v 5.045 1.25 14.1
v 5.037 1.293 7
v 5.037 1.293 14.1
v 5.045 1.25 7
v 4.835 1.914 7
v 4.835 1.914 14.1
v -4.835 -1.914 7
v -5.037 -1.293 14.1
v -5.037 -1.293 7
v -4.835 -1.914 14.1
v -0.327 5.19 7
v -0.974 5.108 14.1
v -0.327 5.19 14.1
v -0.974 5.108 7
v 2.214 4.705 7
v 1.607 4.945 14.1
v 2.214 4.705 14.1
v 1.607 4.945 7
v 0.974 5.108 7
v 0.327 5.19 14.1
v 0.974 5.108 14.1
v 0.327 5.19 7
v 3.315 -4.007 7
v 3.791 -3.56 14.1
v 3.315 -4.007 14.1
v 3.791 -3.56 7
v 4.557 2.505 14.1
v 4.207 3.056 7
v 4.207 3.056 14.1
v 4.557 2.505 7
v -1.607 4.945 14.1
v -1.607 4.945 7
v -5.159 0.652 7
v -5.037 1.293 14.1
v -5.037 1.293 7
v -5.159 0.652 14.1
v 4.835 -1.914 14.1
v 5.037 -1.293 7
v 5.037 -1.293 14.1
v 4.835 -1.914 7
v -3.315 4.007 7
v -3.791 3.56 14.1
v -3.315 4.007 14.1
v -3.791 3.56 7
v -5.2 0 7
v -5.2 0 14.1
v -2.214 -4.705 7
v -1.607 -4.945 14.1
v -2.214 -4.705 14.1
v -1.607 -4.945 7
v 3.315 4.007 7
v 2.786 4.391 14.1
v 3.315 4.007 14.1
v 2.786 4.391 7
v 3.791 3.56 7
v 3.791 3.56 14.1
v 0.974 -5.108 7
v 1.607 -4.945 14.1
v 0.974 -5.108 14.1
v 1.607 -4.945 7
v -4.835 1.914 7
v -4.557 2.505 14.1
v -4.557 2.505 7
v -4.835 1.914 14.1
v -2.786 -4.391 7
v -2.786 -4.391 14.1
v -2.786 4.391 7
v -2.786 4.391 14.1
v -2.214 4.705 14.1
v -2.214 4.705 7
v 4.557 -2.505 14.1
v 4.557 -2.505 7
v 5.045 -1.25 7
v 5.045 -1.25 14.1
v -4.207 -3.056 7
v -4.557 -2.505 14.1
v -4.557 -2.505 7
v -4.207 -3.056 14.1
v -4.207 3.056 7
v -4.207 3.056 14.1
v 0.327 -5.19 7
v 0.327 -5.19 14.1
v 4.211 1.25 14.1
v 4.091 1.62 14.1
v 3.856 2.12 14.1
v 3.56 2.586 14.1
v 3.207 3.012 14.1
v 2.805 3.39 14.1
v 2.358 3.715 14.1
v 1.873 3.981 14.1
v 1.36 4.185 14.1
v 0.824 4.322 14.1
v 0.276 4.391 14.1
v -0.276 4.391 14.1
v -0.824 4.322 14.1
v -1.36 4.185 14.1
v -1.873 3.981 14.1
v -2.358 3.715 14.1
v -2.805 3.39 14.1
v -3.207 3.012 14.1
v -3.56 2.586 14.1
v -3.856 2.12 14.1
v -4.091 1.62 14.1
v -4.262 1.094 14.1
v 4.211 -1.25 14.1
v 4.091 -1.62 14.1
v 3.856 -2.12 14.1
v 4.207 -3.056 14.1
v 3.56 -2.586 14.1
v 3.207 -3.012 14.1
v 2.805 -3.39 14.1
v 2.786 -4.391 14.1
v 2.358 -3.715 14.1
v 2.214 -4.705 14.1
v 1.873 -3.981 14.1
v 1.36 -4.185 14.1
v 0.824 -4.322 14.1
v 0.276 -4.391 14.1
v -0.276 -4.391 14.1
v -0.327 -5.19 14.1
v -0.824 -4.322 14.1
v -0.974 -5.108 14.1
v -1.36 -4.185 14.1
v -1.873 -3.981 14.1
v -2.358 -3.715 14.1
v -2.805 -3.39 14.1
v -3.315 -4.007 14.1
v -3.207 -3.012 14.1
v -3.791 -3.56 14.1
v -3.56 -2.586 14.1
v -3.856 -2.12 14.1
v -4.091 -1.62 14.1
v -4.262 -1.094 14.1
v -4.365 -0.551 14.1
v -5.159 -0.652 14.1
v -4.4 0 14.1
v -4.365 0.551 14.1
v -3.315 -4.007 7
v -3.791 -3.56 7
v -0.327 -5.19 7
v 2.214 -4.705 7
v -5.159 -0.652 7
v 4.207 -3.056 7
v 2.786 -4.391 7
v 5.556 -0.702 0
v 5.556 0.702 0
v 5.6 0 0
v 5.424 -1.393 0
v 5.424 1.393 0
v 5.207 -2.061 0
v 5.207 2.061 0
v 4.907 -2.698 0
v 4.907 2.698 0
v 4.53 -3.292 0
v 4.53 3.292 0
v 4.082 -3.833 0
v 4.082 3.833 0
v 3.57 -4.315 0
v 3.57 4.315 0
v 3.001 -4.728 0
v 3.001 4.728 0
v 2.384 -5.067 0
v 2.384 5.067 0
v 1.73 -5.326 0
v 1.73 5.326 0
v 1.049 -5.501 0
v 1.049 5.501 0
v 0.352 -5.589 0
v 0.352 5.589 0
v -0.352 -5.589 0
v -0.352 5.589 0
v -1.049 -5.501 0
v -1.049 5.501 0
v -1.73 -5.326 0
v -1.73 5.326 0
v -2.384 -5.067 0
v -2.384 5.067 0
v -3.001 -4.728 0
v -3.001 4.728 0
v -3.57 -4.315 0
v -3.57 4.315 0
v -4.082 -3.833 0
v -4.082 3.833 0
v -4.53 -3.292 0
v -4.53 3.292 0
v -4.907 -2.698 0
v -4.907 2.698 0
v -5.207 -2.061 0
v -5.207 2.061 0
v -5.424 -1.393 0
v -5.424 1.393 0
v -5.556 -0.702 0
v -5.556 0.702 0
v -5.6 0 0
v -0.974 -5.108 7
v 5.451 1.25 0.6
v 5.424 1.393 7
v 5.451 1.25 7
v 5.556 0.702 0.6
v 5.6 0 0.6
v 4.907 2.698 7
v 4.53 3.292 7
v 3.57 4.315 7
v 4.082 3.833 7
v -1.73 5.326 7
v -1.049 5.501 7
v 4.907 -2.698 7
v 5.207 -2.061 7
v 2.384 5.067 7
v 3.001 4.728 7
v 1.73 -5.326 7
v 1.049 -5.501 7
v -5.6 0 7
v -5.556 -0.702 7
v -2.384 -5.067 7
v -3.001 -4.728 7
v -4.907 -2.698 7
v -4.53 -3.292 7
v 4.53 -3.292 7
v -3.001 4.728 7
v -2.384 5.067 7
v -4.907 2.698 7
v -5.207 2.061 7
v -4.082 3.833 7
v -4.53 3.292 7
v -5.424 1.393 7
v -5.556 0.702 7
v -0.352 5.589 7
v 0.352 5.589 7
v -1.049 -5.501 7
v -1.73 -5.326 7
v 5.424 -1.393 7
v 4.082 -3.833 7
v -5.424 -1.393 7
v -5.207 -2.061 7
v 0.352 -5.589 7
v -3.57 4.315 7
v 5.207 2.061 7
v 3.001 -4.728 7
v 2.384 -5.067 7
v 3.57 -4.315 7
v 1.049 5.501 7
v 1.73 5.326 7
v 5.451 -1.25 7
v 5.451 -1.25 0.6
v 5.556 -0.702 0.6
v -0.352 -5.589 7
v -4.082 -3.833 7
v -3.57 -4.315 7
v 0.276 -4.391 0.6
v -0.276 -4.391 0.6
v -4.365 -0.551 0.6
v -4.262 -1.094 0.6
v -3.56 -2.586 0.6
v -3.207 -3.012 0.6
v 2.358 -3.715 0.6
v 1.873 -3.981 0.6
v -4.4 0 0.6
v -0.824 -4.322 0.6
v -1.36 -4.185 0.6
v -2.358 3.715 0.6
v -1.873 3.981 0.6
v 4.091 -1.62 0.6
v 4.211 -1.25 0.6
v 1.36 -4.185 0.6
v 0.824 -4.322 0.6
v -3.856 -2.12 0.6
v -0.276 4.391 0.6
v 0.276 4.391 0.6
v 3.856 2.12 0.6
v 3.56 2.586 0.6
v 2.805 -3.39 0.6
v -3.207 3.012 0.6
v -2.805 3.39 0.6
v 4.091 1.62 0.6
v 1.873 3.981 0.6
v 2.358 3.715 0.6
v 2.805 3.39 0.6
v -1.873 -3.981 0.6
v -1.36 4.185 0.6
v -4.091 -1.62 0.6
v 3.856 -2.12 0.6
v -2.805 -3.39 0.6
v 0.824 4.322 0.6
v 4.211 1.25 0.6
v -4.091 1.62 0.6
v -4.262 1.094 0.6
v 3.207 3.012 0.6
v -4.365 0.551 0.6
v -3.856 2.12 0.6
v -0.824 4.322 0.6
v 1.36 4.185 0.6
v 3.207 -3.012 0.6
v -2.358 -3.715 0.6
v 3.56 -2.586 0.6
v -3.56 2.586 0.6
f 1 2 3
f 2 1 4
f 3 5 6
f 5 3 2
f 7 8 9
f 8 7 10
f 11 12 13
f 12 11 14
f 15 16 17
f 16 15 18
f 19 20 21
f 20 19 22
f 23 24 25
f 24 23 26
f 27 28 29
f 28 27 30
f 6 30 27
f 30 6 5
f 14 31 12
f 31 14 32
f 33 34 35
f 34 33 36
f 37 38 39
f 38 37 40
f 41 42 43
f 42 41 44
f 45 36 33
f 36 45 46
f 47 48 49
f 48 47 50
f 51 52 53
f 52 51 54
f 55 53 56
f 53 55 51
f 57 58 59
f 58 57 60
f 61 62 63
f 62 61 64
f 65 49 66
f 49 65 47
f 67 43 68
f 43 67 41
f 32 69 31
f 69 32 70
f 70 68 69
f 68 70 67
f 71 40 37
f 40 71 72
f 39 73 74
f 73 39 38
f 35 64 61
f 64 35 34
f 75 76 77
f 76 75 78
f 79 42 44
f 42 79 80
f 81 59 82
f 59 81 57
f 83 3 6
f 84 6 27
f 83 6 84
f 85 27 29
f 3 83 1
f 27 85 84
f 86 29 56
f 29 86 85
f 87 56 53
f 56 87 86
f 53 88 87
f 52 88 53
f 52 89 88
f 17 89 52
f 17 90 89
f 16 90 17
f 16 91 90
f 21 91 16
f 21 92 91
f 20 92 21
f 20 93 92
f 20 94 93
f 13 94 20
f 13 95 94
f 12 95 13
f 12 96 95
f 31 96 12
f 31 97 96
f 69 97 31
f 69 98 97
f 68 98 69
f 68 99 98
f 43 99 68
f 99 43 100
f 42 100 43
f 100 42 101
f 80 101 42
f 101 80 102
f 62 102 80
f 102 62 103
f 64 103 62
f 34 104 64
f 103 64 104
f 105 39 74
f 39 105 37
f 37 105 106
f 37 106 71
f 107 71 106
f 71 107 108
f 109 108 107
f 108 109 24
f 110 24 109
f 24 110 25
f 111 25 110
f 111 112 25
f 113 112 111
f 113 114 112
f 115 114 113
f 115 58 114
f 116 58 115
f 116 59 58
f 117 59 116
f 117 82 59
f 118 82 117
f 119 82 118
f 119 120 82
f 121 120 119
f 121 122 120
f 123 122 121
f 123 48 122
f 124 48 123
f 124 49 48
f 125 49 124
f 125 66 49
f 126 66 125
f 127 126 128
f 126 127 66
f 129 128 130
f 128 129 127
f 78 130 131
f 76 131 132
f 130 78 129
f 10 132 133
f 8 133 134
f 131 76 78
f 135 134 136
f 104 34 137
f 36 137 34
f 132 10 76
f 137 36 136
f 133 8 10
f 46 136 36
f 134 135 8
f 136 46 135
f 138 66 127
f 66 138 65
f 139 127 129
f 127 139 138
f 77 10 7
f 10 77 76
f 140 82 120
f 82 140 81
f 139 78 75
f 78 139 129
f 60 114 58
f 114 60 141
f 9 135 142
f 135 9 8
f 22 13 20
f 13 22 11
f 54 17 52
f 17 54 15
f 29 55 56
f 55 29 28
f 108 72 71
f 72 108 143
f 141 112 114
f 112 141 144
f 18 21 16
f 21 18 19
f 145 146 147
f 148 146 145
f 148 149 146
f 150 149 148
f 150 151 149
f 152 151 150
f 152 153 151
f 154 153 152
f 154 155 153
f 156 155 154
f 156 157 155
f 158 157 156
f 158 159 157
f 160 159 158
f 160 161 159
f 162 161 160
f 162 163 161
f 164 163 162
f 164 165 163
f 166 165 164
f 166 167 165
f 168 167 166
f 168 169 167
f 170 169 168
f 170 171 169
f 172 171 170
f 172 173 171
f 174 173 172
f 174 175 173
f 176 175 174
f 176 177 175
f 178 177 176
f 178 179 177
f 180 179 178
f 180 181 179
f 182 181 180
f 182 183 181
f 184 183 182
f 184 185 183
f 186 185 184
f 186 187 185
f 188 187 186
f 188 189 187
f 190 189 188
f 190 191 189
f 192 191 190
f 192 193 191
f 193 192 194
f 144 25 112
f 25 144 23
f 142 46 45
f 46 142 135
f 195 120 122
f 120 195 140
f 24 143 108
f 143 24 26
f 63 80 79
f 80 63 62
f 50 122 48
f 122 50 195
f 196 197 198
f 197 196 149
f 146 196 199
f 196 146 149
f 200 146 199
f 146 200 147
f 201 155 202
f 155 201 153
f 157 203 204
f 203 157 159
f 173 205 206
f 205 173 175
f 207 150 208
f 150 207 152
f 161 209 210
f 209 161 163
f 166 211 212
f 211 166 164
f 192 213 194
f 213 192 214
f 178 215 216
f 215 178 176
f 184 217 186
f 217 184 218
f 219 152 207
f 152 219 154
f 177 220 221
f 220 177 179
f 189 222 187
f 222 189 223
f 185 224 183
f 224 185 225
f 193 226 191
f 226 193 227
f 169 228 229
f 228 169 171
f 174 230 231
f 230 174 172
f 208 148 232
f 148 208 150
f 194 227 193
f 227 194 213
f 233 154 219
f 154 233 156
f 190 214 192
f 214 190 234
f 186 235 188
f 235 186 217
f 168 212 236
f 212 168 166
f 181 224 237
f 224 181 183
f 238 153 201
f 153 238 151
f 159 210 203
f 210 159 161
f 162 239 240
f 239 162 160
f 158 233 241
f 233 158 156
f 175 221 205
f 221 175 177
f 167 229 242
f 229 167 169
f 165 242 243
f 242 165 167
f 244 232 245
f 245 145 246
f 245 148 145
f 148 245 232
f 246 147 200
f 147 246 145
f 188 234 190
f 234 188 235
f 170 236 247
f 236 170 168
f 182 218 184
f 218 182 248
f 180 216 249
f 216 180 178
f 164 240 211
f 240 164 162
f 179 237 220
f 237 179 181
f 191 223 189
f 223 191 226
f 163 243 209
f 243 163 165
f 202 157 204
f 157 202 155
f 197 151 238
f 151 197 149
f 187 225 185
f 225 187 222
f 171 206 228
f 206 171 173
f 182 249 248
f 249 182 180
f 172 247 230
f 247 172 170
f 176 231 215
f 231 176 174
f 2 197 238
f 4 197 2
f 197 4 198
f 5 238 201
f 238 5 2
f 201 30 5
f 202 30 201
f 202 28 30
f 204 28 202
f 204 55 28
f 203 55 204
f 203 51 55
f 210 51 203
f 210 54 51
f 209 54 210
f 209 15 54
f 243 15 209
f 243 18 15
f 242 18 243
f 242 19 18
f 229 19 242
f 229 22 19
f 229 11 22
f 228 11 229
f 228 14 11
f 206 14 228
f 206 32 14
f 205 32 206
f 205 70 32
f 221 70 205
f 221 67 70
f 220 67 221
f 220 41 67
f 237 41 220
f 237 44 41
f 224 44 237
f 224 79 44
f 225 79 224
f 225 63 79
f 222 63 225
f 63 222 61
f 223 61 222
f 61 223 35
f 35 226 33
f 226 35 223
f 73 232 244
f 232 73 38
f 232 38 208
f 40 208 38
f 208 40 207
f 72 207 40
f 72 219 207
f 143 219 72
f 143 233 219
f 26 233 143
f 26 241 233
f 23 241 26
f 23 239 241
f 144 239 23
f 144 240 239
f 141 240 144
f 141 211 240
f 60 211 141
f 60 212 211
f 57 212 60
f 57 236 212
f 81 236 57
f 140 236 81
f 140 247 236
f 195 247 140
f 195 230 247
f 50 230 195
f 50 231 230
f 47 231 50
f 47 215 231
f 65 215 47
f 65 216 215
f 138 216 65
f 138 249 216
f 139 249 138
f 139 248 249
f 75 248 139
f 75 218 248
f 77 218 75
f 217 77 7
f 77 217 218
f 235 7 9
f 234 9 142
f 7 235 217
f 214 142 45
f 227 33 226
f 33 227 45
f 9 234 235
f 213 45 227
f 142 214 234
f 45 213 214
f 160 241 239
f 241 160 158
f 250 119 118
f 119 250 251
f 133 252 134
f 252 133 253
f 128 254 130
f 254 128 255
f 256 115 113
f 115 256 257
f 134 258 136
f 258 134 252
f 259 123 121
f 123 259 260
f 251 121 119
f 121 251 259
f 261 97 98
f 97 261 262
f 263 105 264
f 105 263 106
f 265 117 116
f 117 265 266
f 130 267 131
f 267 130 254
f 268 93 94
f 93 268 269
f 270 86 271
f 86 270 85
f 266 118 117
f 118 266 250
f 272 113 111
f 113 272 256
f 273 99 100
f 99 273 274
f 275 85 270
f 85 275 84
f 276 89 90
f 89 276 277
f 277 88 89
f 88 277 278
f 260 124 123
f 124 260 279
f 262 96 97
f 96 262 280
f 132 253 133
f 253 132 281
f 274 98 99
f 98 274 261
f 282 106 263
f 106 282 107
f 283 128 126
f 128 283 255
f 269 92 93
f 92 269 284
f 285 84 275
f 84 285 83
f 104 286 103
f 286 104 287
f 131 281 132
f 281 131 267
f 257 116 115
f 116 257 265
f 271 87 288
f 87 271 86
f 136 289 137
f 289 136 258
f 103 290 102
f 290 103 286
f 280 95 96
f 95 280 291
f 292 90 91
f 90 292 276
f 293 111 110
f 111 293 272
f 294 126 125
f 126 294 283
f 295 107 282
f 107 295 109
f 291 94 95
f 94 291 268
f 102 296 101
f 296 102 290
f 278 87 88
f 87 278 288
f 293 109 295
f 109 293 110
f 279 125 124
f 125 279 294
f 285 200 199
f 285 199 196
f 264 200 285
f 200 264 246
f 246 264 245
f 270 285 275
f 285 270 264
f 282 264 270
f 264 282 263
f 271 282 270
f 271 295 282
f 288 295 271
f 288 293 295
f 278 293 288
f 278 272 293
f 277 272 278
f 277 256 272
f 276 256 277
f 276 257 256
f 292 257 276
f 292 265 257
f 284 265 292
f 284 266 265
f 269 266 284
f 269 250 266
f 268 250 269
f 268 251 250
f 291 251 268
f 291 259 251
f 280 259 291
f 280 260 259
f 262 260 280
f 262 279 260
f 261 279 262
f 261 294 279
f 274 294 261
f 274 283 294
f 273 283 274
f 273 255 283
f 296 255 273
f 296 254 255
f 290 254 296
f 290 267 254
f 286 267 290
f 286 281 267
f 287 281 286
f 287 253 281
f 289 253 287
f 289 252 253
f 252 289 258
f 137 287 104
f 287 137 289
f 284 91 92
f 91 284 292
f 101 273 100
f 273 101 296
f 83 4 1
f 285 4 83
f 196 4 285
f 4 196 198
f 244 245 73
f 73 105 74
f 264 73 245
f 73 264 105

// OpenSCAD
height=13.5;
motor=8.8;
wall_size=0.8;
bottom_thickness=0.6;
bottom_pod_padding=0.4;
bottom_pod_height=7;
slit=2.5;

n=0.1;

$fn=50;

difference() {
    union() {
        cylinder(d=motor+wall_size*2,h=height+bottom_thickness);
        cylinder(d=motor+wall_size*2+bottom_pod_padding*2,bottom_pod_height);
    }
    
    translate([0,0,bottom_thickness])
        cylinder(d=motor,h=height+n);
    translate([0,-slit*0.5,bottom_thickness])
        cube([10,slit,height+n]);
}
